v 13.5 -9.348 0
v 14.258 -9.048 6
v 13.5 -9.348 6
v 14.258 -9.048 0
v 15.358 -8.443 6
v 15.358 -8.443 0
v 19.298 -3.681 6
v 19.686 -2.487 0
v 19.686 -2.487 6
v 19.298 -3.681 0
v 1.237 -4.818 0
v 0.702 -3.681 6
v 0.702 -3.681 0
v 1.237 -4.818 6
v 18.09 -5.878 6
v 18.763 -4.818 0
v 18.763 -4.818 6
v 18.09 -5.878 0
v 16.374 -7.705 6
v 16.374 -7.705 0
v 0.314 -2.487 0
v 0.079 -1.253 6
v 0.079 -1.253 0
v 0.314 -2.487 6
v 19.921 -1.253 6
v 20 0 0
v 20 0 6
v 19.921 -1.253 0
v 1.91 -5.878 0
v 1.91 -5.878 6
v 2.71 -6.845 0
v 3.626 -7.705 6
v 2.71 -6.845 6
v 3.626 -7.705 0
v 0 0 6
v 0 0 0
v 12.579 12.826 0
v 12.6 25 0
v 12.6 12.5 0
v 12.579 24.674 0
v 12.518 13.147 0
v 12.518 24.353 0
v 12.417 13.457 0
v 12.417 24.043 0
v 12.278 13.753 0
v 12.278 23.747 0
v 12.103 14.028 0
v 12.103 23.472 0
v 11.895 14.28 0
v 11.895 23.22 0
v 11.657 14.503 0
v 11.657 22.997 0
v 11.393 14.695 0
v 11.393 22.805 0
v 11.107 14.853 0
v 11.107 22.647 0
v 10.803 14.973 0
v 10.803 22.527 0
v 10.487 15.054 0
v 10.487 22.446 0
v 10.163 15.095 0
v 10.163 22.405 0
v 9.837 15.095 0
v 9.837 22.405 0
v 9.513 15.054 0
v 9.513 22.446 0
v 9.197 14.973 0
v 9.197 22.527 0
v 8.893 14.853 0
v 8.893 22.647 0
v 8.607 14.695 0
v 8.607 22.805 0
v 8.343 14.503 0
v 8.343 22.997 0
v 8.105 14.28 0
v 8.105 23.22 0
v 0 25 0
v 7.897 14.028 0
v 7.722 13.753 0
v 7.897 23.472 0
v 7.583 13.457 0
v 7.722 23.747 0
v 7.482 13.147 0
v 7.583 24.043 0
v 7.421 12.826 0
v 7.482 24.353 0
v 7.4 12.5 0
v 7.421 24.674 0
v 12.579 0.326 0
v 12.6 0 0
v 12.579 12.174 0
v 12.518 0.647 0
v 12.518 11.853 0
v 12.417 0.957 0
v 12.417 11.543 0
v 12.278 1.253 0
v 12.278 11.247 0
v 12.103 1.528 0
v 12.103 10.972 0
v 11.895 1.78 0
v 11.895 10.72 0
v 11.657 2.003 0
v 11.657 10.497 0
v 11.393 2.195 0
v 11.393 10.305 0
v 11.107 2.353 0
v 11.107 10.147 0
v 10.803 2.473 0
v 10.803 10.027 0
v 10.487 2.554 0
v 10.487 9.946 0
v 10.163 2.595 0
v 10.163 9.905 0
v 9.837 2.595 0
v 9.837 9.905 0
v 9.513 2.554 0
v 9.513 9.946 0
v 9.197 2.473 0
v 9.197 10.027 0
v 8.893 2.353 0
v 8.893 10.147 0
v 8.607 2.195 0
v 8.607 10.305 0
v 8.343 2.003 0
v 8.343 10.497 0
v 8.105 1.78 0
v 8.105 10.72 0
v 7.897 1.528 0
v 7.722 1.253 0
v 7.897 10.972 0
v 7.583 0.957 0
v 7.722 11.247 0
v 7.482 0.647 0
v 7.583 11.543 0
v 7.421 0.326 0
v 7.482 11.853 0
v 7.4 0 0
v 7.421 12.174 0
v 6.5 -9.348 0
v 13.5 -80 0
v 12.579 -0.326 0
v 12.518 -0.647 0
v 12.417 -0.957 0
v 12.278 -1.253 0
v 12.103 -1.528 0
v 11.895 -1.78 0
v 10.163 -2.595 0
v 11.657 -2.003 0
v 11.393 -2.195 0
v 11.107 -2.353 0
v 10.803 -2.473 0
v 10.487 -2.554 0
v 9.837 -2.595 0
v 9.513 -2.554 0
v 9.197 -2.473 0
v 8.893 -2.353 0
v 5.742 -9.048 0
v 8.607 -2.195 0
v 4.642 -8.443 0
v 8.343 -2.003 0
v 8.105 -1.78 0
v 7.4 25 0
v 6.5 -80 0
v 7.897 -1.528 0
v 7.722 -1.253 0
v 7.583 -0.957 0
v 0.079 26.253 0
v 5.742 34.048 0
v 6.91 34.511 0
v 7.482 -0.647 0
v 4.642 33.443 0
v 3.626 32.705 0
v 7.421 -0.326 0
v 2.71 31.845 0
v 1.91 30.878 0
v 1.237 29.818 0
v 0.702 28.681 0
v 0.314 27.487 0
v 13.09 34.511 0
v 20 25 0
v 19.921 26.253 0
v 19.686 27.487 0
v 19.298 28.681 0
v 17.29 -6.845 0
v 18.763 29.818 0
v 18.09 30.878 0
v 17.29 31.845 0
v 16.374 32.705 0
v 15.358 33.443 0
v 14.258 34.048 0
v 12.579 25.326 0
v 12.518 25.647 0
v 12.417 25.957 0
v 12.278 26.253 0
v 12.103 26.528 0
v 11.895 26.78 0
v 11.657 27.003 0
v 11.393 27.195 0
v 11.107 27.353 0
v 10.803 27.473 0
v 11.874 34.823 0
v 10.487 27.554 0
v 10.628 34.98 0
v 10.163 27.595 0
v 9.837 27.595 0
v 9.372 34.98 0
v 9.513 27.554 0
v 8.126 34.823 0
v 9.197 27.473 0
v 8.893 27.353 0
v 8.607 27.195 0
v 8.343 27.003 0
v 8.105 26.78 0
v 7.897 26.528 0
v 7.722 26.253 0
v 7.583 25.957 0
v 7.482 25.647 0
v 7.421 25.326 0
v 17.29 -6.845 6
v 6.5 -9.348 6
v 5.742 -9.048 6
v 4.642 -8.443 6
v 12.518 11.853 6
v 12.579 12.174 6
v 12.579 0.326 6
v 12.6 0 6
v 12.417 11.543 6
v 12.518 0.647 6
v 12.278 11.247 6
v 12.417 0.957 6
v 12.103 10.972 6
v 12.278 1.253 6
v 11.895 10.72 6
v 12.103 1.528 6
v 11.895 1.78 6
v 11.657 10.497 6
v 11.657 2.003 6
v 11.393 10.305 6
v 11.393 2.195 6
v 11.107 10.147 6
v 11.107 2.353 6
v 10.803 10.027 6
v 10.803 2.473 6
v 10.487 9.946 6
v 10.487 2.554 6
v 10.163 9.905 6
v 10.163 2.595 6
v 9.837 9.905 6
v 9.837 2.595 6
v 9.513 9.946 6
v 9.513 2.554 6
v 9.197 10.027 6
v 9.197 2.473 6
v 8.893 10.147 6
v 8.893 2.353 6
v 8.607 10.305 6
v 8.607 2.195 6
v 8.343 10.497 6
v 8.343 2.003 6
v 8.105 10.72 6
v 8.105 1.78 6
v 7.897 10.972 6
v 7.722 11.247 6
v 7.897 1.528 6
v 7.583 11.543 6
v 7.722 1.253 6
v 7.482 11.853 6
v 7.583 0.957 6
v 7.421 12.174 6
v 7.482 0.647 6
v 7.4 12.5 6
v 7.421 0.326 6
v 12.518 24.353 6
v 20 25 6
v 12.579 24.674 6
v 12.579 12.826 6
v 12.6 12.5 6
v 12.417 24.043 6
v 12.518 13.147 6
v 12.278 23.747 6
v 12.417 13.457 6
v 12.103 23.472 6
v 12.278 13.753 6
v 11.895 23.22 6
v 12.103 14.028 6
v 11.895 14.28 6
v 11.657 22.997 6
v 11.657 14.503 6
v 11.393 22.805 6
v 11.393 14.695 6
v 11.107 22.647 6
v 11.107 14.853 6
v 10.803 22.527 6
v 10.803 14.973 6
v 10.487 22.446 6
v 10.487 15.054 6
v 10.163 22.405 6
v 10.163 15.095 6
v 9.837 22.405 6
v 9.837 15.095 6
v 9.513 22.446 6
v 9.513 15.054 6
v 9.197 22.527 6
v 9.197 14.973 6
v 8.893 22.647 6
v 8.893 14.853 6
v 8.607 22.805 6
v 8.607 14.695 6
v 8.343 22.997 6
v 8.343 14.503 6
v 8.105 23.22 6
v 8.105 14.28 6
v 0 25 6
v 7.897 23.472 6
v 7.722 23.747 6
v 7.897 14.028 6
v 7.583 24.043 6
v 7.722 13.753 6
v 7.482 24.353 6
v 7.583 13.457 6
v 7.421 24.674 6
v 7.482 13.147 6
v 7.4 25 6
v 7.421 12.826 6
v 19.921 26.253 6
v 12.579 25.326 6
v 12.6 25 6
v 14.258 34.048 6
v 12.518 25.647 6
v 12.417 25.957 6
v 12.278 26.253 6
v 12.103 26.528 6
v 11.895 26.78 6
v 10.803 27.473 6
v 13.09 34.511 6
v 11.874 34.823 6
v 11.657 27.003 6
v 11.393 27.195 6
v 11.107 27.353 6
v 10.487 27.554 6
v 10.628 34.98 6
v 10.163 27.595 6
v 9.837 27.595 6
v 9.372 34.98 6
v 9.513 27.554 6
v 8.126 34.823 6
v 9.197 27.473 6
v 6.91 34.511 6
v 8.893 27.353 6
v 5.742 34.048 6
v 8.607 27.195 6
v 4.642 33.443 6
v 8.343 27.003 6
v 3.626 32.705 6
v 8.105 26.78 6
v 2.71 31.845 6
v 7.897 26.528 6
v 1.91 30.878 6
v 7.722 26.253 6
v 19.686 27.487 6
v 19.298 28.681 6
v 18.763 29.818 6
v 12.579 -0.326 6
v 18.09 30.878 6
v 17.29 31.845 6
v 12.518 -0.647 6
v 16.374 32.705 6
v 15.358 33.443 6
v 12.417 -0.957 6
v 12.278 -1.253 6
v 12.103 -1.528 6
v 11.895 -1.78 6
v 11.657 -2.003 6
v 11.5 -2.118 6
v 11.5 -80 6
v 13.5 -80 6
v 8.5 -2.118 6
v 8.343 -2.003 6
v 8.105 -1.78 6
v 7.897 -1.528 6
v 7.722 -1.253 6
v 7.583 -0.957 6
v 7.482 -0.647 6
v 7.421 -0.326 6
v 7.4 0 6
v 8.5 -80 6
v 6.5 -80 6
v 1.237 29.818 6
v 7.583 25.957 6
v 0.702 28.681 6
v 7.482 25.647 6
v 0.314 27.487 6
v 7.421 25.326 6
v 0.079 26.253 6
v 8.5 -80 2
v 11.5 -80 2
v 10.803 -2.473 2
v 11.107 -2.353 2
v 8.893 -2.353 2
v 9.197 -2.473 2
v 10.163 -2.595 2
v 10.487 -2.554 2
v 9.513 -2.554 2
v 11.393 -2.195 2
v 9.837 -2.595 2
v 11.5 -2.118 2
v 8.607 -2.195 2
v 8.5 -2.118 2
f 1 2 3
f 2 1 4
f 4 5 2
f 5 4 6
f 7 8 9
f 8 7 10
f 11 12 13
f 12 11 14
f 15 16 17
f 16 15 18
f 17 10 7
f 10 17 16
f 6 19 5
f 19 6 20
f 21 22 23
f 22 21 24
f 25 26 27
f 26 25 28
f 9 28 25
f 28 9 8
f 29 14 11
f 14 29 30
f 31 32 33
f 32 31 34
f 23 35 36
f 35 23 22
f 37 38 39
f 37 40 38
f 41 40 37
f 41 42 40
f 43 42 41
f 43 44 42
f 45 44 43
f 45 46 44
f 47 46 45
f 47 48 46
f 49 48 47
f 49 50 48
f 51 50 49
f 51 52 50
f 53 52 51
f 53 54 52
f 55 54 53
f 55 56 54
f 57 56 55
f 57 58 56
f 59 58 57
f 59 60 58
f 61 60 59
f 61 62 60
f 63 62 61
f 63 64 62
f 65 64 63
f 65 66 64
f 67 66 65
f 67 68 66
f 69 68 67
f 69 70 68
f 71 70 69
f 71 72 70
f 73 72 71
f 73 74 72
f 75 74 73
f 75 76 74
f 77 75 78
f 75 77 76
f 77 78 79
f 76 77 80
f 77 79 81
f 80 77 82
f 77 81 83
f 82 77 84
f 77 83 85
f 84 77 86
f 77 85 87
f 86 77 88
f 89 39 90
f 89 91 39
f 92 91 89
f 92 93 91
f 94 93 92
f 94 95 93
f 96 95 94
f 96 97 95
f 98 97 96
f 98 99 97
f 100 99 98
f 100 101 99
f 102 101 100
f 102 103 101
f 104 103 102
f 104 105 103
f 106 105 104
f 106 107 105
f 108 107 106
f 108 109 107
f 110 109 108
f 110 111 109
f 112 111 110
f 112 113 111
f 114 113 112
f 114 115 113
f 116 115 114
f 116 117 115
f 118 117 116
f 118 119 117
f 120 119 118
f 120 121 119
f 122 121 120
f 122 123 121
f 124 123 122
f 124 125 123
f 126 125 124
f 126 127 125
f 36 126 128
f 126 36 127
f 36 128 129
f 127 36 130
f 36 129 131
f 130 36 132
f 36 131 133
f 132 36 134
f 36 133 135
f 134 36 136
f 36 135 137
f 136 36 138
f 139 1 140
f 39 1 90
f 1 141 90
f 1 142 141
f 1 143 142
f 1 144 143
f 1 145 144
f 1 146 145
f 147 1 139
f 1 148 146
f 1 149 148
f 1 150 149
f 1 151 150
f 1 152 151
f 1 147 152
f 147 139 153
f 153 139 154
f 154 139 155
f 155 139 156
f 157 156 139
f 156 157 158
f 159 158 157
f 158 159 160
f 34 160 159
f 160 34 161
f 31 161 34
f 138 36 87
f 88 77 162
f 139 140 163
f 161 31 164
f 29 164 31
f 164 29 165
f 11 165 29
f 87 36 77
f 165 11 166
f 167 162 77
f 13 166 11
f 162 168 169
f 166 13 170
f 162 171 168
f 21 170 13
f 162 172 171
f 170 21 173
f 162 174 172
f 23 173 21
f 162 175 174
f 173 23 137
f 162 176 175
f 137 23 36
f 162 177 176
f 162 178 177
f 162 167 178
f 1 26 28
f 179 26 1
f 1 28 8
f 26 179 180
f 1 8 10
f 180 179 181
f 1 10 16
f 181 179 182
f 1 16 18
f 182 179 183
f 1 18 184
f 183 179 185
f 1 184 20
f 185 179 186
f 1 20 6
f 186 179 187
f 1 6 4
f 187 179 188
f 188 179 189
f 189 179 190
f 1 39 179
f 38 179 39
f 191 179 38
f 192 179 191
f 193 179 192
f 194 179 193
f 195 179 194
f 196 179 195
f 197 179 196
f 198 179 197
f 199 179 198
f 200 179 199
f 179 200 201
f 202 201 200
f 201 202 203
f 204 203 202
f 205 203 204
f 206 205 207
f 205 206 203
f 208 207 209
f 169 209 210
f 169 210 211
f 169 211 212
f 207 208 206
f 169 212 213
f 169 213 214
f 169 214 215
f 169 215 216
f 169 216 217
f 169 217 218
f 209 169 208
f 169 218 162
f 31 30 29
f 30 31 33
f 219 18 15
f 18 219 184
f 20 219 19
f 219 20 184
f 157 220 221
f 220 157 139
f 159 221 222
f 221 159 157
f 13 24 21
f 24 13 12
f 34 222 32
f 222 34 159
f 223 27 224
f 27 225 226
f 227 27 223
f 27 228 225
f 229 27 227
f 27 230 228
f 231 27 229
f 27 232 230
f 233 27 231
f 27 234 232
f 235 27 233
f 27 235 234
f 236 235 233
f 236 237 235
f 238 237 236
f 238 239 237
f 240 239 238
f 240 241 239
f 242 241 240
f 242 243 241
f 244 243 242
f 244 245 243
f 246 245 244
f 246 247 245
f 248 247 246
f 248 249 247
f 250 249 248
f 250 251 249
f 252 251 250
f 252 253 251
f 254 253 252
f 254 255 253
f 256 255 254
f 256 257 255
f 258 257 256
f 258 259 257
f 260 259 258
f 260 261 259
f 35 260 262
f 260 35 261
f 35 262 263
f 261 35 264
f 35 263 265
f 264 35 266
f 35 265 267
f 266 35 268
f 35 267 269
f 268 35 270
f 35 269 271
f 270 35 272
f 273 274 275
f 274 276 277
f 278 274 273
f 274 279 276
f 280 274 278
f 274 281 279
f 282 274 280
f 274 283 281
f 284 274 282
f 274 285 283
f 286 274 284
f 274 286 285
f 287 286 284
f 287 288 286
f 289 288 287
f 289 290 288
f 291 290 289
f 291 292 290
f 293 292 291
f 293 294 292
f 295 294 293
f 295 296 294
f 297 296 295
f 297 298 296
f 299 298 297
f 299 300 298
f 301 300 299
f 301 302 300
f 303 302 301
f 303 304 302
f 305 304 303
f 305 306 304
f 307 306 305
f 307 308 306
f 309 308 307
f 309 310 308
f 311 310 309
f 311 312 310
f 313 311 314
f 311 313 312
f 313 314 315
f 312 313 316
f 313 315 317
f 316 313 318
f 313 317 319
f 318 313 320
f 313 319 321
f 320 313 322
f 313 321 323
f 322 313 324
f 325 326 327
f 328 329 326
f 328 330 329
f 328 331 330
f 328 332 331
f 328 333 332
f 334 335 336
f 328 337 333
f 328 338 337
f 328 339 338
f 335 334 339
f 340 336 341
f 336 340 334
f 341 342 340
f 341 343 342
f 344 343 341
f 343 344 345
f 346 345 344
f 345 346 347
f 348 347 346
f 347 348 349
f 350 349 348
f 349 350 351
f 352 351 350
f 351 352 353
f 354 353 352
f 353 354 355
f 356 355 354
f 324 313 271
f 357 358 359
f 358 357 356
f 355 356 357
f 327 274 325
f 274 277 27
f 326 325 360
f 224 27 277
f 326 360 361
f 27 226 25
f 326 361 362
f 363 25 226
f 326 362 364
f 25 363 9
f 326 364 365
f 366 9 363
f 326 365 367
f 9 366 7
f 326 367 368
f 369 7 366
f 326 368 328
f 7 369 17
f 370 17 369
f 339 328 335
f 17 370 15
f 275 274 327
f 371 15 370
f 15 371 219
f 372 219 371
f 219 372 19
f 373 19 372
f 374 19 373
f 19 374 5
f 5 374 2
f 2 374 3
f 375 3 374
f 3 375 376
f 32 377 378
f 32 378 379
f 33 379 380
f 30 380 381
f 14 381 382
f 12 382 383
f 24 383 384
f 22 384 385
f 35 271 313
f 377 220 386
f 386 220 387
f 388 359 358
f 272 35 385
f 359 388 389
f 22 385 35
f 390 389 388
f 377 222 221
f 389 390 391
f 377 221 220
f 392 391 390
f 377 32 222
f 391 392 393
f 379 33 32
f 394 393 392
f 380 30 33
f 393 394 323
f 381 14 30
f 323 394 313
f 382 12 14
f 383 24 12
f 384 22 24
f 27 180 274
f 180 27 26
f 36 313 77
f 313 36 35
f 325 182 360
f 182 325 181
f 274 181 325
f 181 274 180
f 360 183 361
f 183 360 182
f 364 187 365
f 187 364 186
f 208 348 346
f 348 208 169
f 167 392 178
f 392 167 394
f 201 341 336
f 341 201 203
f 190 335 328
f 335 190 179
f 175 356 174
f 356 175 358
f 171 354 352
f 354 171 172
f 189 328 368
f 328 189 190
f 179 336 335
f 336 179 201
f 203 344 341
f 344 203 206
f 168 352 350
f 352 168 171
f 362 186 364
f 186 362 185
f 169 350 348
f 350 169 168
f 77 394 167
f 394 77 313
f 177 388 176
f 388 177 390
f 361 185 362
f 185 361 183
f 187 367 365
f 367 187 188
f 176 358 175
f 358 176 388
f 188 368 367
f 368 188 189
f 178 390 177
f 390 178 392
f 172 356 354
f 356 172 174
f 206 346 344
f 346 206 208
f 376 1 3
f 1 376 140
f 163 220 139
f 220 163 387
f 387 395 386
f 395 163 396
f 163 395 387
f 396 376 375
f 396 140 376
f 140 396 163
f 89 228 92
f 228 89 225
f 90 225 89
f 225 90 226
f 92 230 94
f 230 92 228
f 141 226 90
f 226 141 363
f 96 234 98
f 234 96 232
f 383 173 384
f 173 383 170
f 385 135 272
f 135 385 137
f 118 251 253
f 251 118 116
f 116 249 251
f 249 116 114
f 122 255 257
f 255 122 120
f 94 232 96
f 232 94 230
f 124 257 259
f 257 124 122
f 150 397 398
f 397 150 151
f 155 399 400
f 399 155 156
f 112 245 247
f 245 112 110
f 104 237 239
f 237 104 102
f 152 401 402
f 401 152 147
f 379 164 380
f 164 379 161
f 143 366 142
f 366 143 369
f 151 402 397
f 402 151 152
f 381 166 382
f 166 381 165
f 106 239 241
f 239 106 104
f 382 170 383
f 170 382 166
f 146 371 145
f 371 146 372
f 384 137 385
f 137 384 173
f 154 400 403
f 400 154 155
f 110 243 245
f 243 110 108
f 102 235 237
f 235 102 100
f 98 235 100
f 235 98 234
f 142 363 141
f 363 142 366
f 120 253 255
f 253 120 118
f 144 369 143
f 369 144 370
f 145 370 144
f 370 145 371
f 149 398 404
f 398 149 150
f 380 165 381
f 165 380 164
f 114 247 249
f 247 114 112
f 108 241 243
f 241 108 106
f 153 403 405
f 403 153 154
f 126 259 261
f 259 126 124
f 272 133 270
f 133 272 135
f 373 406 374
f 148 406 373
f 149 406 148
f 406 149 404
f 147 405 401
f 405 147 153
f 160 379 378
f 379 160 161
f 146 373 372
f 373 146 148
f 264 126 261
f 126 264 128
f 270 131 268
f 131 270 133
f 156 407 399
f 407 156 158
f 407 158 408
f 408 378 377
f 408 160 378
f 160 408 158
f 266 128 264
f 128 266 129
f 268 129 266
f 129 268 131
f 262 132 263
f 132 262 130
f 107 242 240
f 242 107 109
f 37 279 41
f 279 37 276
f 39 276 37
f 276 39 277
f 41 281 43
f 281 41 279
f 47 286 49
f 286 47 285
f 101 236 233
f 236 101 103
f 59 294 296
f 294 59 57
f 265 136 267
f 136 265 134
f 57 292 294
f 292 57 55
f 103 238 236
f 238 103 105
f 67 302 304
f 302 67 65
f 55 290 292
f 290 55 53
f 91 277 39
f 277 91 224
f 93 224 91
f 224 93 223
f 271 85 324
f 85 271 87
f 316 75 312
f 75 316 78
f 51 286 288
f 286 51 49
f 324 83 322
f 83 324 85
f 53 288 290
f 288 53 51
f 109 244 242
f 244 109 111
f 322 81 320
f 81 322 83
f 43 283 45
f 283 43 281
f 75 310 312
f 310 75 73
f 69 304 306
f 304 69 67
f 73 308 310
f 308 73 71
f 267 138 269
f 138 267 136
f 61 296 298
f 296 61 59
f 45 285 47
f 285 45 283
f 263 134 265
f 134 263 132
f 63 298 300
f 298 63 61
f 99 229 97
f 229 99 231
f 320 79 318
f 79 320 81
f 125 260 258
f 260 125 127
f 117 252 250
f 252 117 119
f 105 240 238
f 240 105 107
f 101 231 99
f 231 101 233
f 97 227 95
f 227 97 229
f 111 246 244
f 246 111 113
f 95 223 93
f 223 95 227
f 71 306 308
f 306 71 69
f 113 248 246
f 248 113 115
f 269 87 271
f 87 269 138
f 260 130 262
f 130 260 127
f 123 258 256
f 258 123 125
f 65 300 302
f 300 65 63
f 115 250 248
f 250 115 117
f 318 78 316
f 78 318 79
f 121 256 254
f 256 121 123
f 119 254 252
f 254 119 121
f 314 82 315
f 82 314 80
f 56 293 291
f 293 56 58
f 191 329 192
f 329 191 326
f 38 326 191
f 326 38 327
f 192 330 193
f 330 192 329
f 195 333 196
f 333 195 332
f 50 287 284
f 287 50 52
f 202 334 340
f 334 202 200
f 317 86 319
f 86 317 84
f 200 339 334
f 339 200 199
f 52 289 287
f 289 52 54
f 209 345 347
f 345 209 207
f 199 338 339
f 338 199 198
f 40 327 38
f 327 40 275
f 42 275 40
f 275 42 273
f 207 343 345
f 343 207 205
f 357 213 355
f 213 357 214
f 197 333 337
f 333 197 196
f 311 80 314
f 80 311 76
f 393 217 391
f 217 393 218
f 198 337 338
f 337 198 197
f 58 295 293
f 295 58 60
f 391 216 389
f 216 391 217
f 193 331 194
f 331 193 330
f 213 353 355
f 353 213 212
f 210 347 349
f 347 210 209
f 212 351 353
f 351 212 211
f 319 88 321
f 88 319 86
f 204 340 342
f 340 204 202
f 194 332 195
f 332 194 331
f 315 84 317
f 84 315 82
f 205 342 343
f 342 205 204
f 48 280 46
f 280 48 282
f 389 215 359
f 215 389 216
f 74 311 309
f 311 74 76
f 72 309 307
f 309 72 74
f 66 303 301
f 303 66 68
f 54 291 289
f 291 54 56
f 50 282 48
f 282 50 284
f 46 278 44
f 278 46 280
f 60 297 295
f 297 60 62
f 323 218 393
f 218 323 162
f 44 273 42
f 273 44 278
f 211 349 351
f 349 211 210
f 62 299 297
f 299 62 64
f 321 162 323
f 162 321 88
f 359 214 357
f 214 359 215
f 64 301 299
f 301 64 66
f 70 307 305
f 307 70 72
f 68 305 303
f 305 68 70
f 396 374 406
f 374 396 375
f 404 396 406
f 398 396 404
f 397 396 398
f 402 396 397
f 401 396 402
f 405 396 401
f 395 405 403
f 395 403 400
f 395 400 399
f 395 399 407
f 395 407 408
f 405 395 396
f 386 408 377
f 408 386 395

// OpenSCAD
$fn=50;

difference() {
  union() {
    translate([10, 0, 0])
      cylinder(6, 10, 10);

    cube([20, 25, 6]);

    translate([10, 25, 0])
      cylinder(6, 10, 10);
    
    translate([6.5, -80, 0])
      cube([7, 80, 6]);
  }

  translate([10, 0, -1])
    cylinder(10, 2.6, 2.6);

  translate([10, 12.5, -1])
    cylinder(10, 2.6, 2.6);

  translate([10, 25, -1])
    cylinder(10, 2.6, 2.6);

  translate([8.5, -90, 2])
    cube([3, 90, 5]);

}
